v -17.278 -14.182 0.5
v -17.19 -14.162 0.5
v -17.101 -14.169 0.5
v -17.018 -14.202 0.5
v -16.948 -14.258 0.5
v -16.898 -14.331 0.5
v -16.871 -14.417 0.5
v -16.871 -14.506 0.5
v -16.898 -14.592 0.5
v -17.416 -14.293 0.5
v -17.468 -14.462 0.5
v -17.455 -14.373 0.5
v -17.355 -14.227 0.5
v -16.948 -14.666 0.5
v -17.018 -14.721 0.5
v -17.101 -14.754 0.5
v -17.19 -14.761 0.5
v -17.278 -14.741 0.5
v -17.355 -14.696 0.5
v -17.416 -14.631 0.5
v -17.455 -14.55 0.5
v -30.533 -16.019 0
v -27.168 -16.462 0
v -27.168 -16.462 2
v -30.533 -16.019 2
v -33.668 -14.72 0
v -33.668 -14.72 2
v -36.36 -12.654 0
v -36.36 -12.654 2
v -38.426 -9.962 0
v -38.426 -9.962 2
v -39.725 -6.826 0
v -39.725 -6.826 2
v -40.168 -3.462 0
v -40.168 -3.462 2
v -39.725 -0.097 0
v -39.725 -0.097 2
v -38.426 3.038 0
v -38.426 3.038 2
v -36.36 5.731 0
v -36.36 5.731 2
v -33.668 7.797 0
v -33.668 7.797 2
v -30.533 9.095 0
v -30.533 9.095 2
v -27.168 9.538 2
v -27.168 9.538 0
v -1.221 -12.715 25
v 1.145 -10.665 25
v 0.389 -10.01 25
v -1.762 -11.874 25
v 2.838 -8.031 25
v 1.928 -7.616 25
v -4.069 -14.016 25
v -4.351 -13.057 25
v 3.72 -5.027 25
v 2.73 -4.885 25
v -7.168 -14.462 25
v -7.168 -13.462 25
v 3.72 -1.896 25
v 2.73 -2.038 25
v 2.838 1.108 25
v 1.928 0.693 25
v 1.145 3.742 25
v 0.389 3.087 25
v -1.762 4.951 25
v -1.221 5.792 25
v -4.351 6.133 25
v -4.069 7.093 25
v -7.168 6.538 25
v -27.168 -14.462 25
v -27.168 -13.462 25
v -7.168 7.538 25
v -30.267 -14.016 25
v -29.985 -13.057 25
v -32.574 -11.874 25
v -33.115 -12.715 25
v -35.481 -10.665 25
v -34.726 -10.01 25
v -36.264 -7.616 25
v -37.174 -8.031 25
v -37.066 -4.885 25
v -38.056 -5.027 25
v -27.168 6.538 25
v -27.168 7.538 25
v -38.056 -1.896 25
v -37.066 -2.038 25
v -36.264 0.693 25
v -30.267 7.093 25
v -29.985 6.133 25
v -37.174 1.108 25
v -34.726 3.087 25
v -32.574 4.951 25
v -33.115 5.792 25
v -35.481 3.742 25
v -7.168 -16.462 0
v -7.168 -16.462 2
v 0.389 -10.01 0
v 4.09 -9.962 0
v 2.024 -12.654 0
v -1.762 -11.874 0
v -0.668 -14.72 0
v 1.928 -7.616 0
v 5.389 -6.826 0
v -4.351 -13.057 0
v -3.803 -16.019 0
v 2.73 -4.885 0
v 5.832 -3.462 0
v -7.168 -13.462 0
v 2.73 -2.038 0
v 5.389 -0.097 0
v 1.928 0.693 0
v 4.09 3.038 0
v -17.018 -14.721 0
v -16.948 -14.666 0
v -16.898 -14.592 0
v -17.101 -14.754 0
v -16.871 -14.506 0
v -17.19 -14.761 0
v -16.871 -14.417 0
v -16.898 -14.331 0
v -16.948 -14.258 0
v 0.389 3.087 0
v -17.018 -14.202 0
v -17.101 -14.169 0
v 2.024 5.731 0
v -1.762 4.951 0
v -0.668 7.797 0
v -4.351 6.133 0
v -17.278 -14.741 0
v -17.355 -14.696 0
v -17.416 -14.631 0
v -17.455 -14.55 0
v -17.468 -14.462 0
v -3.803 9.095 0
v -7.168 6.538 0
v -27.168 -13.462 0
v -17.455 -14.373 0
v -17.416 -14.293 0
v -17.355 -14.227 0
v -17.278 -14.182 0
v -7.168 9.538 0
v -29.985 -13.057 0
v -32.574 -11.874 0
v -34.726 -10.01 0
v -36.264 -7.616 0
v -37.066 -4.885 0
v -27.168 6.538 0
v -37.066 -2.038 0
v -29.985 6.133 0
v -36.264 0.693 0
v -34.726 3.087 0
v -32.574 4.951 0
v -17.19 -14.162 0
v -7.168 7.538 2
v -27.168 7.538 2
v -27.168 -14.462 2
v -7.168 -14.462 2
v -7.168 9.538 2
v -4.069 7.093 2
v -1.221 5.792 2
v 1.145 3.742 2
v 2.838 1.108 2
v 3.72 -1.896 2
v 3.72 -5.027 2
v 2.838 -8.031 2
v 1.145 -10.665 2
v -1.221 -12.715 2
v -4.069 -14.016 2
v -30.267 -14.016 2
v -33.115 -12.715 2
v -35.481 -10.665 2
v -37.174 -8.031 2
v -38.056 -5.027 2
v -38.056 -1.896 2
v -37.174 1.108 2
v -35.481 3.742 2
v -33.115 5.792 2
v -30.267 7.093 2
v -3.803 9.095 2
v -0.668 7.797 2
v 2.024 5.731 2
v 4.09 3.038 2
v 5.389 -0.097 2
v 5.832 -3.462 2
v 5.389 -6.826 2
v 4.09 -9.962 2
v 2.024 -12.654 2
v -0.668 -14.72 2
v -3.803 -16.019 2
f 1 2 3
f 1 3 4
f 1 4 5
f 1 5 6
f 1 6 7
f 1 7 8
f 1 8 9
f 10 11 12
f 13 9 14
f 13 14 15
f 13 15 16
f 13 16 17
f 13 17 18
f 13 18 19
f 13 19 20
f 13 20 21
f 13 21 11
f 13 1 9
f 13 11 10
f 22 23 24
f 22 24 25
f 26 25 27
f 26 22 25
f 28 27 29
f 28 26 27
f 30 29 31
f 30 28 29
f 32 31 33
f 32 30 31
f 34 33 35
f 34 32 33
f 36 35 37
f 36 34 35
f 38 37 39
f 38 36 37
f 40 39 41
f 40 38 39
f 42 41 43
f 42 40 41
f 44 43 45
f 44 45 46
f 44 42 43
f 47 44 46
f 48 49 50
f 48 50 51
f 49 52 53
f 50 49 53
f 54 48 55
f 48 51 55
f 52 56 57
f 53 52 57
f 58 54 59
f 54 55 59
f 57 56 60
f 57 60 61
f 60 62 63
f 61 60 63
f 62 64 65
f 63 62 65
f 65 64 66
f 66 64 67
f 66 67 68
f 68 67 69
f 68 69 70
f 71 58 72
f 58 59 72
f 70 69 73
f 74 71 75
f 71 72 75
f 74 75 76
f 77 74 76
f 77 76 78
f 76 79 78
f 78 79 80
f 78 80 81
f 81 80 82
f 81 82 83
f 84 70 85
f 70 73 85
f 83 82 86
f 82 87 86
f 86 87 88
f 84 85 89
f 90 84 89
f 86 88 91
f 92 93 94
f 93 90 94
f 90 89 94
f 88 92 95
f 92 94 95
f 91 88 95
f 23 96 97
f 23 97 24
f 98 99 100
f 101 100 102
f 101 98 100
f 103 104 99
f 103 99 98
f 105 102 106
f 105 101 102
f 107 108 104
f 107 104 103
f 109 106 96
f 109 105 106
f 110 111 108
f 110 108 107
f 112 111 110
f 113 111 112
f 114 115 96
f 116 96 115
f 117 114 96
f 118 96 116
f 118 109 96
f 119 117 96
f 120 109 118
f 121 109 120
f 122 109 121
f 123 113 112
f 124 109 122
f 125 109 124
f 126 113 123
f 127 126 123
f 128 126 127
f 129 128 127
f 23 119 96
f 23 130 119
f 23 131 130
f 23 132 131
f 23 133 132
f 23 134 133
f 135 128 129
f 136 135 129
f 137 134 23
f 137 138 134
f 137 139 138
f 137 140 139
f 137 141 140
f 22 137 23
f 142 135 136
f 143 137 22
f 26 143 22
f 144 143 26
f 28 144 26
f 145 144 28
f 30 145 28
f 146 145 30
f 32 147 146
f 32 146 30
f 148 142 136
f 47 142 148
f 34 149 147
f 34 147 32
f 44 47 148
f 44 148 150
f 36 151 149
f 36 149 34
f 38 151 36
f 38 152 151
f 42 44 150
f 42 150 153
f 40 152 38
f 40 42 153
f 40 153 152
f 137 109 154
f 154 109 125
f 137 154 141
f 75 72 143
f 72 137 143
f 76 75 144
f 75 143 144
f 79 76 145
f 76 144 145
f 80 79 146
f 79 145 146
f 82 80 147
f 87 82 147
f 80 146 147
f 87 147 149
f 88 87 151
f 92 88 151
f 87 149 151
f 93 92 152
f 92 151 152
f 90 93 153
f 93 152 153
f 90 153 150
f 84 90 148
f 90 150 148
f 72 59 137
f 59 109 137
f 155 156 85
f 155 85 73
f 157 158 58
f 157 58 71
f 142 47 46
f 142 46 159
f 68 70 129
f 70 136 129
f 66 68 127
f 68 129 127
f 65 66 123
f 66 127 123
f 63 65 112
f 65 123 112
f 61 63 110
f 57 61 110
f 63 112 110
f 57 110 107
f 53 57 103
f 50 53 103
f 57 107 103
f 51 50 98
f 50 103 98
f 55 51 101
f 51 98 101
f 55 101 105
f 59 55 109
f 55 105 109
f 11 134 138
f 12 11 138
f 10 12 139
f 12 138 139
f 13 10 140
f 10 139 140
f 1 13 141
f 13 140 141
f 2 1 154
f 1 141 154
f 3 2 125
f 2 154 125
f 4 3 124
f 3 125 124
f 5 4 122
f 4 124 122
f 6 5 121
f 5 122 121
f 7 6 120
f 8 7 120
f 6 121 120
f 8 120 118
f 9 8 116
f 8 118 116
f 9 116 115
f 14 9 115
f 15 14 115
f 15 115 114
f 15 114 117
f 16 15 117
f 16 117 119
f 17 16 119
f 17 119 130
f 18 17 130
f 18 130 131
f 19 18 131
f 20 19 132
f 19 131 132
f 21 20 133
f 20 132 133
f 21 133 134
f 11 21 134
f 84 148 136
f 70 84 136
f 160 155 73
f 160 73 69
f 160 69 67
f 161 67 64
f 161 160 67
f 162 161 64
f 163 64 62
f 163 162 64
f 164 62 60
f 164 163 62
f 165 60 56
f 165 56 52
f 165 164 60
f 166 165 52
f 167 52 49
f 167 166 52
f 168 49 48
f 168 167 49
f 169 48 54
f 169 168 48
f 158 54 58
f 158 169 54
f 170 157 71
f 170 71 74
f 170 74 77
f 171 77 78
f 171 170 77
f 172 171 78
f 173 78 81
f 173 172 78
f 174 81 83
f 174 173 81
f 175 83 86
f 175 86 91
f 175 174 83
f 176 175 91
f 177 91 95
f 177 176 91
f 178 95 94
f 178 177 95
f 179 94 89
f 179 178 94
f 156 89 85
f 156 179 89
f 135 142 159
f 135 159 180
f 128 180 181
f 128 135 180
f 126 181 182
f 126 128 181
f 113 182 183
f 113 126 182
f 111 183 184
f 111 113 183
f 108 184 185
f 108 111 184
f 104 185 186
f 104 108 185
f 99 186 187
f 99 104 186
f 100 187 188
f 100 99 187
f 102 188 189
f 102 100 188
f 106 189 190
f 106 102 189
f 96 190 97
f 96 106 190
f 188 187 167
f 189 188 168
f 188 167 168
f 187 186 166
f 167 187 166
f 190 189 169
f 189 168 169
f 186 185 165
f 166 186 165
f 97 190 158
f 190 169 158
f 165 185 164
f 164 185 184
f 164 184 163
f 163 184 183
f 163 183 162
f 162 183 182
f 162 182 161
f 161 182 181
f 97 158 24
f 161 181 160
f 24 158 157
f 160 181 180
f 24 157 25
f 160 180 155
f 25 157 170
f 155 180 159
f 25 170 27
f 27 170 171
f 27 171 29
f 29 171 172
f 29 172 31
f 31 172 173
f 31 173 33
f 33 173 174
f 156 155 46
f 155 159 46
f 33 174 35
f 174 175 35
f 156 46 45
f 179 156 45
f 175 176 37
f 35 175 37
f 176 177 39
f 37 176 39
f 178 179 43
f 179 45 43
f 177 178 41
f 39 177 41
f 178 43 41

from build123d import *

# Parameters (mm, degrees)
EXTRUDE_1_DEPTH     = 2
EXTRUDE_2_DEPTH     = 23
SKETCH_4_R          = 0.3
CUT_EXTRUDE_2_DEPTH = 0.5


with BuildPart() as part:
    # 草图1 → 凸台-拉伸1 (new body)
    with BuildSketch(Plane.XY):
        with BuildLine():
            Line((-7.168044136, -16.461643491), (-27.168044136, -16.461643491))
            ThreePointArc((-27.168044136, -16.461643491), (-40.168044136, -3.461643491), (-27.168044136, 9.538356509))
            Line((-27.168044136, 9.538356509), (-7.168044136, 9.538356509))
            ThreePointArc((-7.168044136, 9.538356509), (5.831955864, -3.461643491), (-7.168044136, -16.461643491))
        make_face()
        with BuildLine():
            Line((-27.168044136, -13.461643491), (-7.168044136, -13.461643491))
            ThreePointArc((-7.168044136, -13.461643491), (2.831955864, -3.461643491), (-7.168044136, 6.538356509))
            Line((-7.168044136, 6.538356509), (-27.168044136, 6.538356509))
            ThreePointArc((-27.168044136, 6.538356509), (-37.168044136, -3.461643491), (-27.168044136, -13.461643491))
        make_face(mode=Mode.SUBTRACT)
    extrude(amount=EXTRUDE_1_DEPTH)

    # 草图2 → 凸台-拉伸2 (add)
    with BuildSketch(Plane.XY.offset(2)):
        with BuildLine():
            Line((-27.168044136, 7.538356509), (-7.168044136, 7.538356509))
            ThreePointArc((-7.168044136, 7.538356509), (3.831955864, -3.461643491), (-7.168044136, -14.461643491))
            Line((-7.168044136, -14.461643491), (-27.168044136, -14.461643491))
            ThreePointArc((-27.168044136, -14.461643491), (-38.168044136, -3.461643491), (-27.168044136, 7.538356509))
        make_face()
        with BuildLine():
            Line((-27.168044136, 6.538356509), (-7.168044136, 6.538356509))
            ThreePointArc((-7.168044136, 6.538356509), (2.831955864, -3.461643491), (-7.168044136, -13.461643491))
            Line((-7.168044136, -13.461643491), (-27.168044136, -13.461643491))
            ThreePointArc((-27.168044136, -13.461643491), (-37.168044136, -3.461643491), (-27.168044136, 6.538356509))
        make_face(mode=Mode.SUBTRACT)
    extrude(amount=EXTRUDE_2_DEPTH)

    # 草图4 → 切除-拉伸2 (cut)
    with BuildSketch(Plane(origin=(0, 0, 0), x_dir=(-1, 0, 0), z_dir=(0, 0, -1))):
        with Locations((17.168044136, -14.461643491)):
            Circle(SKETCH_4_R)
    extrude(amount=-CUT_EXTRUDE_2_DEPTH, mode=Mode.SUBTRACT)


solid = part.part
